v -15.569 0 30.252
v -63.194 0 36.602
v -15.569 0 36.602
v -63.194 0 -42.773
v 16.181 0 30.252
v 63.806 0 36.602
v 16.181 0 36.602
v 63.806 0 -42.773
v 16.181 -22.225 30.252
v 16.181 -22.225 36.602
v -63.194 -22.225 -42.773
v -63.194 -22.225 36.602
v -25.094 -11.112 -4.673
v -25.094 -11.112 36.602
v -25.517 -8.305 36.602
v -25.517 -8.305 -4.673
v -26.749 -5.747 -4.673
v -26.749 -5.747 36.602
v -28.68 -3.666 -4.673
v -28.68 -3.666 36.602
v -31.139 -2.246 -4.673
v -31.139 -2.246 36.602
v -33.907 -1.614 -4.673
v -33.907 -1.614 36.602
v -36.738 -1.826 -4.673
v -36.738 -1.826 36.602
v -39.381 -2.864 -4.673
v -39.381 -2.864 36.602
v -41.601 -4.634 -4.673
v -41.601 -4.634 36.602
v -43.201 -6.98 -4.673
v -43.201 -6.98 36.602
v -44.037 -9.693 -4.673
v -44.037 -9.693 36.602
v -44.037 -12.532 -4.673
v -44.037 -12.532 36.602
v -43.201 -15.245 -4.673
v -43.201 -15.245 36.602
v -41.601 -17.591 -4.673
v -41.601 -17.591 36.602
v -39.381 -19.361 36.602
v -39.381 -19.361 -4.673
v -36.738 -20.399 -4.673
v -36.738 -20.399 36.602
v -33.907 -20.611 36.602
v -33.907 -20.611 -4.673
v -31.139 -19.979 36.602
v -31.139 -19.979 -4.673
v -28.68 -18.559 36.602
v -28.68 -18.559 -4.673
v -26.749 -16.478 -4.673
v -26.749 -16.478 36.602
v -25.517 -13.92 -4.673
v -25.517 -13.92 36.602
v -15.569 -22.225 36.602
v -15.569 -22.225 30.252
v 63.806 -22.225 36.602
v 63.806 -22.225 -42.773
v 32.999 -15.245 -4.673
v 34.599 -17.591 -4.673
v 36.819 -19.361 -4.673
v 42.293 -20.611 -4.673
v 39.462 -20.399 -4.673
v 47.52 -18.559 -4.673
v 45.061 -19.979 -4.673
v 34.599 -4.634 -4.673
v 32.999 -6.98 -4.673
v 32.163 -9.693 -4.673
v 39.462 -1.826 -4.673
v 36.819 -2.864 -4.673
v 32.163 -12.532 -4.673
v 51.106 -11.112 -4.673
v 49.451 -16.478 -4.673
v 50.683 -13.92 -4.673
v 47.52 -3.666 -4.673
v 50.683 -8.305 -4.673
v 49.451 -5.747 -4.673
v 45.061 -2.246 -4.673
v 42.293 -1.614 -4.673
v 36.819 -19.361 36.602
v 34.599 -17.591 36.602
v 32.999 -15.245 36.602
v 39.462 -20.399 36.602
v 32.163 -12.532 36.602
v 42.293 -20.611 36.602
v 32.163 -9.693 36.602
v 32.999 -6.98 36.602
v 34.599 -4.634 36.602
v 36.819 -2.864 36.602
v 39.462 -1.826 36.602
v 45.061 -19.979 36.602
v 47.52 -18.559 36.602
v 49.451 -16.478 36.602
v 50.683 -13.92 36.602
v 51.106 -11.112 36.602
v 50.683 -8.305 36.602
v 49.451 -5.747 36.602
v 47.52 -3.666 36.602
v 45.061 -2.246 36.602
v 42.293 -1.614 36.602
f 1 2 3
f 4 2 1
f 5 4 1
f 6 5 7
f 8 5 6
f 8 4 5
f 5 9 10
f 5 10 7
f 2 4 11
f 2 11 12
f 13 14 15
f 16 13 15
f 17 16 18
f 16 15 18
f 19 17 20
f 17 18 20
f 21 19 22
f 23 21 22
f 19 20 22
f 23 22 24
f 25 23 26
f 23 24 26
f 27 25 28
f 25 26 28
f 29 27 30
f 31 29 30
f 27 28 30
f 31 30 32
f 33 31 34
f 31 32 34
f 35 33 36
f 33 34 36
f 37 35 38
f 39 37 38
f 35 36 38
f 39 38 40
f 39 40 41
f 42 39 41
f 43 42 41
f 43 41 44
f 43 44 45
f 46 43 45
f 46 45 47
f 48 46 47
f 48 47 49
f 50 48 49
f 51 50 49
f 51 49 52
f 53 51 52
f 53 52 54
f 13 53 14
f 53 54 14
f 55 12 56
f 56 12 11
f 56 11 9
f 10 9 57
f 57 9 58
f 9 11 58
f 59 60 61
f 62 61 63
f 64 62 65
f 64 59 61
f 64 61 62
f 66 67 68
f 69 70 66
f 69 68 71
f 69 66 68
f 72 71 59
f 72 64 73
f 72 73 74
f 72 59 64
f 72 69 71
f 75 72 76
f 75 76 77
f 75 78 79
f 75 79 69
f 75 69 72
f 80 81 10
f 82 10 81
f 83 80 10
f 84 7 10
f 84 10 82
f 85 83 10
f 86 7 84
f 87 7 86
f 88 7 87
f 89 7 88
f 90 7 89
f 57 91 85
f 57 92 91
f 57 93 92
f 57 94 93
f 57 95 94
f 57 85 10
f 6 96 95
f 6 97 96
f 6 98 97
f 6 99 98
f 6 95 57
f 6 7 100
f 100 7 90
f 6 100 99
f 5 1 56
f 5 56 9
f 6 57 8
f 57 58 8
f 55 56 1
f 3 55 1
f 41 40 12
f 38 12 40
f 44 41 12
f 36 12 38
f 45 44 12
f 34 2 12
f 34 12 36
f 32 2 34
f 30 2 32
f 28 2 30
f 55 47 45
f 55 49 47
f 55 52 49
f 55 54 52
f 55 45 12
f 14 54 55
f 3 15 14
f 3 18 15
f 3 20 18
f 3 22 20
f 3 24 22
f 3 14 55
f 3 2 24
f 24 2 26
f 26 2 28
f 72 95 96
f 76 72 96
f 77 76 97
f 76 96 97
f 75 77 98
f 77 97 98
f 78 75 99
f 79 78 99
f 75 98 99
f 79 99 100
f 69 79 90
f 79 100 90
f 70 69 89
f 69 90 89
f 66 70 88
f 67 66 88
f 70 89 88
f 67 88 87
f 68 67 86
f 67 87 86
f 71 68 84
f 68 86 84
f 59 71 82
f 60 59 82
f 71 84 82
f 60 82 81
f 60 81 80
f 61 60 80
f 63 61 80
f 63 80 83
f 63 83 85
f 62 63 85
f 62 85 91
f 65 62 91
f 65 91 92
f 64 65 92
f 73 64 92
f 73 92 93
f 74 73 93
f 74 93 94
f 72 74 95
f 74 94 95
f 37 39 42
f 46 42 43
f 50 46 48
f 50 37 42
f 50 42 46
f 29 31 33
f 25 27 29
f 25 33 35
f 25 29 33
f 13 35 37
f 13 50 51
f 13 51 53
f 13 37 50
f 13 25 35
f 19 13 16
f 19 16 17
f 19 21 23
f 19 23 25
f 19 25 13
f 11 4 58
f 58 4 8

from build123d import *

# Parameters (mm, degrees)
F0_W     = 127
F0_H     = 73.025
F1_DEPTH = 22.225
F2_W     = 47.625
F2_H     = 22.225
F3_DEPTH = 6.35
F4_R     = 9.525
F5_DEPTH = 41.275


with BuildPart() as f1:
    # F0 (on Front) → F1 (new body)
    with BuildSketch(Plane.XZ):
        with Locations((0.306161, -6.260679)):
            Rectangle(F0_W, F0_H)
    extrude(amount=F1_DEPTH)

    # F2 (on face) → F3 (join)
    with BuildSketch(Plane.XY.offset(30.251821)):
        with Locations((39.993661, -11.1125)):
            Rectangle(F2_W, F2_H)
        with Locations((-39.381339, -11.1125)):
            Rectangle(F2_W, F2_H)
    extrude(amount=F3_DEPTH)

    # F4 (on face) → F5 (cut)
    with BuildSketch(Plane.XY.offset(36.601821)):
        with Locations((-34.618839, -11.1125)):
            Circle(F4_R)
        with Locations((41.581161, -11.1125)):
            Circle(F4_R)
    extrude(amount=-F5_DEPTH, mode=Mode.SUBTRACT)


solid = f1.part
